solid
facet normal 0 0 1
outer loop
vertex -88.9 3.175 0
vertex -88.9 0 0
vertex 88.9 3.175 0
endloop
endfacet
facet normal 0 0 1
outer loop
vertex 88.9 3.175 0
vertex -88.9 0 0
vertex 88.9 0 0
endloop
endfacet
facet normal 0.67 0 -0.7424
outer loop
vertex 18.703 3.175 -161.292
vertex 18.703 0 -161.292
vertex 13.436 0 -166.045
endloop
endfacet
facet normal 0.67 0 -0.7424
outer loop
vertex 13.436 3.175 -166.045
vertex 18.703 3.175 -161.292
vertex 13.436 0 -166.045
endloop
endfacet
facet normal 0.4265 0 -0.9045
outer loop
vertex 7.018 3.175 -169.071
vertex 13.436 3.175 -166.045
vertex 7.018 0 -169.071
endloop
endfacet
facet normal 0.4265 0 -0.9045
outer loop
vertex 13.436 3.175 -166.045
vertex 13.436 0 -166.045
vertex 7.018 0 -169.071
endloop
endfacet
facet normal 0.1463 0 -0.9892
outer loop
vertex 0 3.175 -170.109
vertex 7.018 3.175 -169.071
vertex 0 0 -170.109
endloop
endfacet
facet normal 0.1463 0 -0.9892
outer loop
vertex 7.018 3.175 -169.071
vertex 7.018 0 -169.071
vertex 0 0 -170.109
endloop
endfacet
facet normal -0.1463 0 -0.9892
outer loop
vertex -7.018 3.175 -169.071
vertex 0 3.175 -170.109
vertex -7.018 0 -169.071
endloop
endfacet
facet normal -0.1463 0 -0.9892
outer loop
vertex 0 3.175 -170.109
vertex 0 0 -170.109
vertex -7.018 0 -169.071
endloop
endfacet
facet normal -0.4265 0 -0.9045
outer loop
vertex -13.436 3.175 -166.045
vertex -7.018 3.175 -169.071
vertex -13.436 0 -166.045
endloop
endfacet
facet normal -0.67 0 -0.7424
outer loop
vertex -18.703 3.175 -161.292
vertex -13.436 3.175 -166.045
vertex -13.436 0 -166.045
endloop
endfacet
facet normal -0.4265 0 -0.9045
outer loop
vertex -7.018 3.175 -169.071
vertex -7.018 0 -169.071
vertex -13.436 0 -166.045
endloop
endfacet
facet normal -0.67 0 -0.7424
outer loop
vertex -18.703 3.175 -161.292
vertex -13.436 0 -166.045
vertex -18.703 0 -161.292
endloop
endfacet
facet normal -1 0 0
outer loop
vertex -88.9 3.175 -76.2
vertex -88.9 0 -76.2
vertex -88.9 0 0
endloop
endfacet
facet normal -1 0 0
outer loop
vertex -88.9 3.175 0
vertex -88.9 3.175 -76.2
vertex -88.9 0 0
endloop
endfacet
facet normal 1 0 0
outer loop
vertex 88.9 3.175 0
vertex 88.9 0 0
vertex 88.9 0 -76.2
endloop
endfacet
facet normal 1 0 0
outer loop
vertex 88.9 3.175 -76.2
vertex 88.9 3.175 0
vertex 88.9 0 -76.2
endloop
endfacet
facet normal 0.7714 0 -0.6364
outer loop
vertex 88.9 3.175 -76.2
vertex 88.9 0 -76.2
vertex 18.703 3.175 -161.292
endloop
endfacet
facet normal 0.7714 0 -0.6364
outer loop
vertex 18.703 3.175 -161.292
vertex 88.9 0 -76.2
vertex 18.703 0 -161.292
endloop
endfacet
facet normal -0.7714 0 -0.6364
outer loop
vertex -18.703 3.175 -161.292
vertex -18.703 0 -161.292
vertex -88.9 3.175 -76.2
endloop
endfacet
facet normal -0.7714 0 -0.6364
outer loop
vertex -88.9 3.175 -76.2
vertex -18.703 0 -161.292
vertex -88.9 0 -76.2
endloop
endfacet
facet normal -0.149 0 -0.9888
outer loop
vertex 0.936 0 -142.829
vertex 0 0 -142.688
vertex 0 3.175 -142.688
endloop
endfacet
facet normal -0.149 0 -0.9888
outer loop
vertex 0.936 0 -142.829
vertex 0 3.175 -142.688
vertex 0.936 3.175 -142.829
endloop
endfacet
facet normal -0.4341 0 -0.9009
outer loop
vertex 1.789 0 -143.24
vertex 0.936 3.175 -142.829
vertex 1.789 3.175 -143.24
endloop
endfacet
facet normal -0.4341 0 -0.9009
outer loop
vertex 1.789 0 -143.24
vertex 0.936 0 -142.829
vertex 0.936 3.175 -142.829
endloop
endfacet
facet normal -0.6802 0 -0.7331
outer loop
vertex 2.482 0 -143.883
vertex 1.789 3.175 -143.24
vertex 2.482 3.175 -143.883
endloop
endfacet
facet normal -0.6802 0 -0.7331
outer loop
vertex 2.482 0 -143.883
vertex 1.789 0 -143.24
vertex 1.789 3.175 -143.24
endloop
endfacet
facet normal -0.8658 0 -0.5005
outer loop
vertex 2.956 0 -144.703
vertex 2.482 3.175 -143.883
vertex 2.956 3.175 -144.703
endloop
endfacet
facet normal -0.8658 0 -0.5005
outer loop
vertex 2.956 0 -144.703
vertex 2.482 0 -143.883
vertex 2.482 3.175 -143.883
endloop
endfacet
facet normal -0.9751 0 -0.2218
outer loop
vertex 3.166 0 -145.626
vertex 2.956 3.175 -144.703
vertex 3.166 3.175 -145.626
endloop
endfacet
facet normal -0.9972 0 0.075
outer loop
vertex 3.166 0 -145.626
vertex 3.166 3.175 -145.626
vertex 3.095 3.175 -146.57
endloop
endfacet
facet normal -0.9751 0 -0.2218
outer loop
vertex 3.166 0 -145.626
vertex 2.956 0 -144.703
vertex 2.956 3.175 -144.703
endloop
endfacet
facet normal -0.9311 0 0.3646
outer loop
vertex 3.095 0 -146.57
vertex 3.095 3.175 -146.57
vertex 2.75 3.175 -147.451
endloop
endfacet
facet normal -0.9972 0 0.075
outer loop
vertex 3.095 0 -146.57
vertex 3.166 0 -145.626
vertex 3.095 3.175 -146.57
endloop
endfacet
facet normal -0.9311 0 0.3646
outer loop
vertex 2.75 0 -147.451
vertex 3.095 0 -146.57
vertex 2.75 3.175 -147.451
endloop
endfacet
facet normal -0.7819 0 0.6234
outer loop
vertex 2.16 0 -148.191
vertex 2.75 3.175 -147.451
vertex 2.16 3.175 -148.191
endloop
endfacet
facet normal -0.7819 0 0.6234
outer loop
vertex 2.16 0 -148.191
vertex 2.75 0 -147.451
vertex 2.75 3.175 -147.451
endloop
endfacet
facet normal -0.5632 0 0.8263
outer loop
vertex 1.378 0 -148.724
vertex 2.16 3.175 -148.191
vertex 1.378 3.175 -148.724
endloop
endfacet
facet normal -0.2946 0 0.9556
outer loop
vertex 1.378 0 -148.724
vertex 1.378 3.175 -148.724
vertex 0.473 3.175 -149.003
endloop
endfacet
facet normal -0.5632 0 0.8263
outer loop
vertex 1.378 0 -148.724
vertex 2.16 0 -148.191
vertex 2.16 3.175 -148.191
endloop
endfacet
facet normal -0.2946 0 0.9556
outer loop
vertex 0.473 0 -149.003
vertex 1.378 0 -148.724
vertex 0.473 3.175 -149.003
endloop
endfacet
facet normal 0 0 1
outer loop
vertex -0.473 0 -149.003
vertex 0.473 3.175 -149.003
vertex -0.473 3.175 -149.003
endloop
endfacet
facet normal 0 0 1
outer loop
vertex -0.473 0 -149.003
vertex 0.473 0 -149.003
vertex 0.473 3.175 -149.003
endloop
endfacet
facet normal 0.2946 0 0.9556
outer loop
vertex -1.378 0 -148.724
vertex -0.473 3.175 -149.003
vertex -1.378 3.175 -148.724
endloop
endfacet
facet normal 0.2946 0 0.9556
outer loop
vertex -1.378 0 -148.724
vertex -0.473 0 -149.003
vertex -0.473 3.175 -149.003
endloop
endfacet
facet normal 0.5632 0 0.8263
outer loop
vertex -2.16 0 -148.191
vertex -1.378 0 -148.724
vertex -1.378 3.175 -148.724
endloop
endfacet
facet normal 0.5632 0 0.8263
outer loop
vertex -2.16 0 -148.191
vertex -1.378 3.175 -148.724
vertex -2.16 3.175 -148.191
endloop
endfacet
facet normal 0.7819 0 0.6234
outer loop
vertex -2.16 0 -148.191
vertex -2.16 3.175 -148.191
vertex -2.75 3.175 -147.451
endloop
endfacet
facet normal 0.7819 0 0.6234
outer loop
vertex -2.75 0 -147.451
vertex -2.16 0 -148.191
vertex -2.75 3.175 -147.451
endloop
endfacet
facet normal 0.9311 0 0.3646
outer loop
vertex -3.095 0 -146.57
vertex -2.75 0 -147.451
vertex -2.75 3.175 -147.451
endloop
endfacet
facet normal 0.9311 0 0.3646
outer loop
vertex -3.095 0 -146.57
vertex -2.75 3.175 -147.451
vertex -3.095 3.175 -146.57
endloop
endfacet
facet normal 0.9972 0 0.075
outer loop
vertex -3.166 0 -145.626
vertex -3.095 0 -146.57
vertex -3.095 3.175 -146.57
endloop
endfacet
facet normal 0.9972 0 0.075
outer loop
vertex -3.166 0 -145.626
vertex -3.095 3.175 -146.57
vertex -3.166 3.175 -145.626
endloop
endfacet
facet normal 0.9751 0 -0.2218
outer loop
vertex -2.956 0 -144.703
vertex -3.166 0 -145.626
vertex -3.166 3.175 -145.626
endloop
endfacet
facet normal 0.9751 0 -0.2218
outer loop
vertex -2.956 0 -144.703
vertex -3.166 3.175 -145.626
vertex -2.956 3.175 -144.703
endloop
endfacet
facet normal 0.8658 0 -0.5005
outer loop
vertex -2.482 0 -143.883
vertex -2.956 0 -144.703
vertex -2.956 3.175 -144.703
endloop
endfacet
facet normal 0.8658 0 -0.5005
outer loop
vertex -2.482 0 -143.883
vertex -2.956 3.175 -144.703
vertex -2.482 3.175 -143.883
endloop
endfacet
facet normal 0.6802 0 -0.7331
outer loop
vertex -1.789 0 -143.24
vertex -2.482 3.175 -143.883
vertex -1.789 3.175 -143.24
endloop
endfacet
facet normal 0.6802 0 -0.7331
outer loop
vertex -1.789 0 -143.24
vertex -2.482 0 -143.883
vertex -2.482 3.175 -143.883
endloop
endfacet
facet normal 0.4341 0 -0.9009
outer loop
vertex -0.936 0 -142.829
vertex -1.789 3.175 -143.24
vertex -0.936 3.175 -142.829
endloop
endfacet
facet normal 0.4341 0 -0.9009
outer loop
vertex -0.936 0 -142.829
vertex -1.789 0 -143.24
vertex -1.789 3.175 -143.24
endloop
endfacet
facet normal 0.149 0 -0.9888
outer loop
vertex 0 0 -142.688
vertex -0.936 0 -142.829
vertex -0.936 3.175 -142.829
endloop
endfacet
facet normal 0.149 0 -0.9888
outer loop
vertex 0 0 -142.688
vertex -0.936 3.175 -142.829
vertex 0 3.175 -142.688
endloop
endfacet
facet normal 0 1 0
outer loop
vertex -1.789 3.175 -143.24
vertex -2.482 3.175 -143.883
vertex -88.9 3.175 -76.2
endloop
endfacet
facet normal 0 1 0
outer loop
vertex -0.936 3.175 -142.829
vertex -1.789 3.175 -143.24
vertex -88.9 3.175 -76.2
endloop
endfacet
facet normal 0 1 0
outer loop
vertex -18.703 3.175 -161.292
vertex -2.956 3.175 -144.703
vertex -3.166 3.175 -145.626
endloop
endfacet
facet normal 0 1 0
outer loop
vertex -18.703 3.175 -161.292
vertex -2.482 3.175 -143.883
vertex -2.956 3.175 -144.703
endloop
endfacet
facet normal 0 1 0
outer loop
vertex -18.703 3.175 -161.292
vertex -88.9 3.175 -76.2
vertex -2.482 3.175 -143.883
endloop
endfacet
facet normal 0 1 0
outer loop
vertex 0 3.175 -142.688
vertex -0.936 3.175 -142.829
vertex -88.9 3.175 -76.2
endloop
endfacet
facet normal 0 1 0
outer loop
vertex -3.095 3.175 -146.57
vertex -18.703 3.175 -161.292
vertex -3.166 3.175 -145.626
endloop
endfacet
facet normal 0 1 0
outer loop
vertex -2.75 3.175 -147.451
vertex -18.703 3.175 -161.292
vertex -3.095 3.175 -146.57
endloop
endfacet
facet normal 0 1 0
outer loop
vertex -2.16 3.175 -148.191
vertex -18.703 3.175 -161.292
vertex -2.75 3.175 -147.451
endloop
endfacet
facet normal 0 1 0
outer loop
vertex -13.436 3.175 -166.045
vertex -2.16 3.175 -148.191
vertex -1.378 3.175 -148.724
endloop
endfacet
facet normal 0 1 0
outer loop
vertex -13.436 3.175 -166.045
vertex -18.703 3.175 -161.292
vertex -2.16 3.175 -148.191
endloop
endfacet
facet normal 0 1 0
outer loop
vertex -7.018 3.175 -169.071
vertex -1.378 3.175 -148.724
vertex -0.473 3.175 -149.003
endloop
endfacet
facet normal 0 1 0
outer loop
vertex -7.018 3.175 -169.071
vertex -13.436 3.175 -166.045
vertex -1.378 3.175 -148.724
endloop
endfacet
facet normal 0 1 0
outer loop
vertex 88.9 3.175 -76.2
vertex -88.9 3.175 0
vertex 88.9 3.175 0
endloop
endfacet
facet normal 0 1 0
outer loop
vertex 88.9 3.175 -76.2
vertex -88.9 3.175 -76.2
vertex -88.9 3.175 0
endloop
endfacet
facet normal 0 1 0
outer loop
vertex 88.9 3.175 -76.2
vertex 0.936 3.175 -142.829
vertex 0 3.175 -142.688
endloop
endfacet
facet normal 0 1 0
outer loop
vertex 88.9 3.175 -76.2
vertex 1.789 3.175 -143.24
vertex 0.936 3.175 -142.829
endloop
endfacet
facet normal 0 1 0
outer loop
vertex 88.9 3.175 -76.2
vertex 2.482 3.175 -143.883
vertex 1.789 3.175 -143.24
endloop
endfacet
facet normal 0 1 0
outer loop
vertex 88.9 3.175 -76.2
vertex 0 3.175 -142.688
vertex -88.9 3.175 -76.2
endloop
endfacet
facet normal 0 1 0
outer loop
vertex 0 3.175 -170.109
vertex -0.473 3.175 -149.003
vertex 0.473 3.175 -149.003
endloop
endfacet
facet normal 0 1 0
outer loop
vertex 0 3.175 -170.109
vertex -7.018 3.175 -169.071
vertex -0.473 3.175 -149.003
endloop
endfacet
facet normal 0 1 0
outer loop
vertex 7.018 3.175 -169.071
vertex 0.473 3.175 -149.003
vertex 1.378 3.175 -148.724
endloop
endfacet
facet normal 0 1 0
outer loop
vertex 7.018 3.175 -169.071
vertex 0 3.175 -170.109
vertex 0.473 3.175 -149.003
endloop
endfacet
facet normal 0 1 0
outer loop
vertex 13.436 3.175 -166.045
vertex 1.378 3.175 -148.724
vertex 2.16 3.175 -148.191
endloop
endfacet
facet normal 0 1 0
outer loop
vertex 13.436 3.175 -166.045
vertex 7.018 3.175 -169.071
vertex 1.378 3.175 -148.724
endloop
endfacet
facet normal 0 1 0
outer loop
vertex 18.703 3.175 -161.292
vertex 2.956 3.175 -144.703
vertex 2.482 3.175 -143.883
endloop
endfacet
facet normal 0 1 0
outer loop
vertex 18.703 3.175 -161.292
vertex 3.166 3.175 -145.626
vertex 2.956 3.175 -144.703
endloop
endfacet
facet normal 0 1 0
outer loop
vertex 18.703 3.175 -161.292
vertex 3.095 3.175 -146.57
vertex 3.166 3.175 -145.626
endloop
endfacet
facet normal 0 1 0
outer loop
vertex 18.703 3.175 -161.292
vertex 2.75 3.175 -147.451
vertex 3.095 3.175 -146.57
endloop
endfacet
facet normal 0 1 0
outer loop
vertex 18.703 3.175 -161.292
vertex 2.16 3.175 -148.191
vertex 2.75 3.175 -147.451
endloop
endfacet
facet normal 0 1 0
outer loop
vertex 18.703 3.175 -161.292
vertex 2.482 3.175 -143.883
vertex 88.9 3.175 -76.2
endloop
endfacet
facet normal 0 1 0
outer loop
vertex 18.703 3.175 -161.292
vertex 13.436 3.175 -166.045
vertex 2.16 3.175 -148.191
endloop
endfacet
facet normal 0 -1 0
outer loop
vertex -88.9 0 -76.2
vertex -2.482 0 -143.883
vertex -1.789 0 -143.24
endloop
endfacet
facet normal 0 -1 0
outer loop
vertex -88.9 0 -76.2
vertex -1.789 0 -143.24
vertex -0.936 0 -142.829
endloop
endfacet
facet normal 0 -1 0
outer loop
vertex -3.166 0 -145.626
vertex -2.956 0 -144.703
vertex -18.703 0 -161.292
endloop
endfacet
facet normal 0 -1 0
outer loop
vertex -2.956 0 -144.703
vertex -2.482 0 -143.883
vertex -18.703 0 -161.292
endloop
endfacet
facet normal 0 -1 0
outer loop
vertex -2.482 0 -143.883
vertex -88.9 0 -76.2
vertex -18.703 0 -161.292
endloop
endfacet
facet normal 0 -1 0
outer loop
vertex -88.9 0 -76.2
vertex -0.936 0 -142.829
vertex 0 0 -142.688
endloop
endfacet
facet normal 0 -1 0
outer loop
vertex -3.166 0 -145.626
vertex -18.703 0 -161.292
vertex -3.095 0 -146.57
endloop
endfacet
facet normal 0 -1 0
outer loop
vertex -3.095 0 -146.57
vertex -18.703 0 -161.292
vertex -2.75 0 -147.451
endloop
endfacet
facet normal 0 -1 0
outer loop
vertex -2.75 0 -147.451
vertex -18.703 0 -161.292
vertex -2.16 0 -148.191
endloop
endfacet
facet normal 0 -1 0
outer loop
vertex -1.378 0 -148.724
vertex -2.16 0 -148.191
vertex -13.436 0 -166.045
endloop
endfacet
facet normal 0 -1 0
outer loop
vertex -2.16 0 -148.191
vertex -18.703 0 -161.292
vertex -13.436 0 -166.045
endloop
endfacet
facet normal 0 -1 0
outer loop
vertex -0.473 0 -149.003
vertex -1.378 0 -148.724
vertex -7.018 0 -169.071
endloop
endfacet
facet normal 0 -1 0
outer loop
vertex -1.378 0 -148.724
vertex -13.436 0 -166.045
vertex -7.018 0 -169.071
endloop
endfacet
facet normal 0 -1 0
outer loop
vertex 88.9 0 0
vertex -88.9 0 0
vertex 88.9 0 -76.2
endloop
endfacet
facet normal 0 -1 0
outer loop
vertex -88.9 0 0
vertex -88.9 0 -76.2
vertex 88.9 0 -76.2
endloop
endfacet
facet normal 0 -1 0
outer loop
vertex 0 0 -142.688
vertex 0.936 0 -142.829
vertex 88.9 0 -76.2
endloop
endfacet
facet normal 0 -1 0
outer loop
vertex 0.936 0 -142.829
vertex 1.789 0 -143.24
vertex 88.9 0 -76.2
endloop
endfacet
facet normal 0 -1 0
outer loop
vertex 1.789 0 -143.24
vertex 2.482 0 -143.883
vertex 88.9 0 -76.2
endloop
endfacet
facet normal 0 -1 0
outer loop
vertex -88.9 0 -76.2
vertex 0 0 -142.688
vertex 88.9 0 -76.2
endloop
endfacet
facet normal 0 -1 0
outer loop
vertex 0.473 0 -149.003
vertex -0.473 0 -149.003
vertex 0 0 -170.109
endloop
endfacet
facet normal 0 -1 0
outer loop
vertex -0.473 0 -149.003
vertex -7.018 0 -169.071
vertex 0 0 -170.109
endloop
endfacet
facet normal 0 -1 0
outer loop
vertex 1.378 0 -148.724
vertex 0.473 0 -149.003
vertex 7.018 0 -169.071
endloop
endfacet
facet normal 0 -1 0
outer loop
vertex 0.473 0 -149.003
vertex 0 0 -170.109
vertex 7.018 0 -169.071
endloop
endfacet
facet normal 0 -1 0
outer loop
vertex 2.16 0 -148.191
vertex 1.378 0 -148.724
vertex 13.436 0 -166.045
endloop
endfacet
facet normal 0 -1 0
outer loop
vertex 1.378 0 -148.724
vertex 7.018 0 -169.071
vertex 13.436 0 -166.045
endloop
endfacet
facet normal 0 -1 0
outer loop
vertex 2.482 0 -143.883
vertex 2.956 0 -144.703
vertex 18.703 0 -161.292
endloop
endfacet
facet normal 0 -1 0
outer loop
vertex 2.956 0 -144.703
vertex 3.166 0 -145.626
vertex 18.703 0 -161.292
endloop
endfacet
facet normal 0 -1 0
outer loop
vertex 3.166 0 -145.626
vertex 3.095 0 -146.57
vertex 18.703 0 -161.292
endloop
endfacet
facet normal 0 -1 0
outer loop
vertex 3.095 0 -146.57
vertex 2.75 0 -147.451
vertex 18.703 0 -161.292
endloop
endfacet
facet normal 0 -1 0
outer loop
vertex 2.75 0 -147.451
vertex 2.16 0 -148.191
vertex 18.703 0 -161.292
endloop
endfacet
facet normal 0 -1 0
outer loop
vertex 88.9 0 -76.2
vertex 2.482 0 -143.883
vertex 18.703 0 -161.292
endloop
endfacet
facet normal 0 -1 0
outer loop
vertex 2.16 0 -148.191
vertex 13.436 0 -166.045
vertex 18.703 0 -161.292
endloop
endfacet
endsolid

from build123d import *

# Parameters (mm, degrees)
SKETCH1_R           = 3.175
BOSS_EXTRUDE1_DEPTH = 3.175


with BuildPart() as part:
    # Sketch1 → Boss-Extrude1 (new body)
    with BuildSketch(Plane(origin=(0, 0, 0), x_dir=(1, 0, 0), z_dir=(0, 1, 0))):
        with BuildLine():
            Line((-88.9, 0), (88.9, 0))
            Line((88.9, 0), (88.9, 76.2))
            Line((88.9, 76.2), (18.702682169, 161.291999073))
            ThreePointArc((18.702682169, 161.291999073), (0, 170.108527998), (-18.702682169, 161.291999073))
            Line((-18.702682169, 161.291999073), (-88.9, 76.2))
            Line((-88.9, 76.2), (-88.9, 0))
        make_face()
        with Locations(Location((0, 145.863073453, 0), (0, 0, 270))):
            Circle(SKETCH1_R, mode=Mode.SUBTRACT)
    extrude(amount=BOSS_EXTRUDE1_DEPTH)


solid = part.part
